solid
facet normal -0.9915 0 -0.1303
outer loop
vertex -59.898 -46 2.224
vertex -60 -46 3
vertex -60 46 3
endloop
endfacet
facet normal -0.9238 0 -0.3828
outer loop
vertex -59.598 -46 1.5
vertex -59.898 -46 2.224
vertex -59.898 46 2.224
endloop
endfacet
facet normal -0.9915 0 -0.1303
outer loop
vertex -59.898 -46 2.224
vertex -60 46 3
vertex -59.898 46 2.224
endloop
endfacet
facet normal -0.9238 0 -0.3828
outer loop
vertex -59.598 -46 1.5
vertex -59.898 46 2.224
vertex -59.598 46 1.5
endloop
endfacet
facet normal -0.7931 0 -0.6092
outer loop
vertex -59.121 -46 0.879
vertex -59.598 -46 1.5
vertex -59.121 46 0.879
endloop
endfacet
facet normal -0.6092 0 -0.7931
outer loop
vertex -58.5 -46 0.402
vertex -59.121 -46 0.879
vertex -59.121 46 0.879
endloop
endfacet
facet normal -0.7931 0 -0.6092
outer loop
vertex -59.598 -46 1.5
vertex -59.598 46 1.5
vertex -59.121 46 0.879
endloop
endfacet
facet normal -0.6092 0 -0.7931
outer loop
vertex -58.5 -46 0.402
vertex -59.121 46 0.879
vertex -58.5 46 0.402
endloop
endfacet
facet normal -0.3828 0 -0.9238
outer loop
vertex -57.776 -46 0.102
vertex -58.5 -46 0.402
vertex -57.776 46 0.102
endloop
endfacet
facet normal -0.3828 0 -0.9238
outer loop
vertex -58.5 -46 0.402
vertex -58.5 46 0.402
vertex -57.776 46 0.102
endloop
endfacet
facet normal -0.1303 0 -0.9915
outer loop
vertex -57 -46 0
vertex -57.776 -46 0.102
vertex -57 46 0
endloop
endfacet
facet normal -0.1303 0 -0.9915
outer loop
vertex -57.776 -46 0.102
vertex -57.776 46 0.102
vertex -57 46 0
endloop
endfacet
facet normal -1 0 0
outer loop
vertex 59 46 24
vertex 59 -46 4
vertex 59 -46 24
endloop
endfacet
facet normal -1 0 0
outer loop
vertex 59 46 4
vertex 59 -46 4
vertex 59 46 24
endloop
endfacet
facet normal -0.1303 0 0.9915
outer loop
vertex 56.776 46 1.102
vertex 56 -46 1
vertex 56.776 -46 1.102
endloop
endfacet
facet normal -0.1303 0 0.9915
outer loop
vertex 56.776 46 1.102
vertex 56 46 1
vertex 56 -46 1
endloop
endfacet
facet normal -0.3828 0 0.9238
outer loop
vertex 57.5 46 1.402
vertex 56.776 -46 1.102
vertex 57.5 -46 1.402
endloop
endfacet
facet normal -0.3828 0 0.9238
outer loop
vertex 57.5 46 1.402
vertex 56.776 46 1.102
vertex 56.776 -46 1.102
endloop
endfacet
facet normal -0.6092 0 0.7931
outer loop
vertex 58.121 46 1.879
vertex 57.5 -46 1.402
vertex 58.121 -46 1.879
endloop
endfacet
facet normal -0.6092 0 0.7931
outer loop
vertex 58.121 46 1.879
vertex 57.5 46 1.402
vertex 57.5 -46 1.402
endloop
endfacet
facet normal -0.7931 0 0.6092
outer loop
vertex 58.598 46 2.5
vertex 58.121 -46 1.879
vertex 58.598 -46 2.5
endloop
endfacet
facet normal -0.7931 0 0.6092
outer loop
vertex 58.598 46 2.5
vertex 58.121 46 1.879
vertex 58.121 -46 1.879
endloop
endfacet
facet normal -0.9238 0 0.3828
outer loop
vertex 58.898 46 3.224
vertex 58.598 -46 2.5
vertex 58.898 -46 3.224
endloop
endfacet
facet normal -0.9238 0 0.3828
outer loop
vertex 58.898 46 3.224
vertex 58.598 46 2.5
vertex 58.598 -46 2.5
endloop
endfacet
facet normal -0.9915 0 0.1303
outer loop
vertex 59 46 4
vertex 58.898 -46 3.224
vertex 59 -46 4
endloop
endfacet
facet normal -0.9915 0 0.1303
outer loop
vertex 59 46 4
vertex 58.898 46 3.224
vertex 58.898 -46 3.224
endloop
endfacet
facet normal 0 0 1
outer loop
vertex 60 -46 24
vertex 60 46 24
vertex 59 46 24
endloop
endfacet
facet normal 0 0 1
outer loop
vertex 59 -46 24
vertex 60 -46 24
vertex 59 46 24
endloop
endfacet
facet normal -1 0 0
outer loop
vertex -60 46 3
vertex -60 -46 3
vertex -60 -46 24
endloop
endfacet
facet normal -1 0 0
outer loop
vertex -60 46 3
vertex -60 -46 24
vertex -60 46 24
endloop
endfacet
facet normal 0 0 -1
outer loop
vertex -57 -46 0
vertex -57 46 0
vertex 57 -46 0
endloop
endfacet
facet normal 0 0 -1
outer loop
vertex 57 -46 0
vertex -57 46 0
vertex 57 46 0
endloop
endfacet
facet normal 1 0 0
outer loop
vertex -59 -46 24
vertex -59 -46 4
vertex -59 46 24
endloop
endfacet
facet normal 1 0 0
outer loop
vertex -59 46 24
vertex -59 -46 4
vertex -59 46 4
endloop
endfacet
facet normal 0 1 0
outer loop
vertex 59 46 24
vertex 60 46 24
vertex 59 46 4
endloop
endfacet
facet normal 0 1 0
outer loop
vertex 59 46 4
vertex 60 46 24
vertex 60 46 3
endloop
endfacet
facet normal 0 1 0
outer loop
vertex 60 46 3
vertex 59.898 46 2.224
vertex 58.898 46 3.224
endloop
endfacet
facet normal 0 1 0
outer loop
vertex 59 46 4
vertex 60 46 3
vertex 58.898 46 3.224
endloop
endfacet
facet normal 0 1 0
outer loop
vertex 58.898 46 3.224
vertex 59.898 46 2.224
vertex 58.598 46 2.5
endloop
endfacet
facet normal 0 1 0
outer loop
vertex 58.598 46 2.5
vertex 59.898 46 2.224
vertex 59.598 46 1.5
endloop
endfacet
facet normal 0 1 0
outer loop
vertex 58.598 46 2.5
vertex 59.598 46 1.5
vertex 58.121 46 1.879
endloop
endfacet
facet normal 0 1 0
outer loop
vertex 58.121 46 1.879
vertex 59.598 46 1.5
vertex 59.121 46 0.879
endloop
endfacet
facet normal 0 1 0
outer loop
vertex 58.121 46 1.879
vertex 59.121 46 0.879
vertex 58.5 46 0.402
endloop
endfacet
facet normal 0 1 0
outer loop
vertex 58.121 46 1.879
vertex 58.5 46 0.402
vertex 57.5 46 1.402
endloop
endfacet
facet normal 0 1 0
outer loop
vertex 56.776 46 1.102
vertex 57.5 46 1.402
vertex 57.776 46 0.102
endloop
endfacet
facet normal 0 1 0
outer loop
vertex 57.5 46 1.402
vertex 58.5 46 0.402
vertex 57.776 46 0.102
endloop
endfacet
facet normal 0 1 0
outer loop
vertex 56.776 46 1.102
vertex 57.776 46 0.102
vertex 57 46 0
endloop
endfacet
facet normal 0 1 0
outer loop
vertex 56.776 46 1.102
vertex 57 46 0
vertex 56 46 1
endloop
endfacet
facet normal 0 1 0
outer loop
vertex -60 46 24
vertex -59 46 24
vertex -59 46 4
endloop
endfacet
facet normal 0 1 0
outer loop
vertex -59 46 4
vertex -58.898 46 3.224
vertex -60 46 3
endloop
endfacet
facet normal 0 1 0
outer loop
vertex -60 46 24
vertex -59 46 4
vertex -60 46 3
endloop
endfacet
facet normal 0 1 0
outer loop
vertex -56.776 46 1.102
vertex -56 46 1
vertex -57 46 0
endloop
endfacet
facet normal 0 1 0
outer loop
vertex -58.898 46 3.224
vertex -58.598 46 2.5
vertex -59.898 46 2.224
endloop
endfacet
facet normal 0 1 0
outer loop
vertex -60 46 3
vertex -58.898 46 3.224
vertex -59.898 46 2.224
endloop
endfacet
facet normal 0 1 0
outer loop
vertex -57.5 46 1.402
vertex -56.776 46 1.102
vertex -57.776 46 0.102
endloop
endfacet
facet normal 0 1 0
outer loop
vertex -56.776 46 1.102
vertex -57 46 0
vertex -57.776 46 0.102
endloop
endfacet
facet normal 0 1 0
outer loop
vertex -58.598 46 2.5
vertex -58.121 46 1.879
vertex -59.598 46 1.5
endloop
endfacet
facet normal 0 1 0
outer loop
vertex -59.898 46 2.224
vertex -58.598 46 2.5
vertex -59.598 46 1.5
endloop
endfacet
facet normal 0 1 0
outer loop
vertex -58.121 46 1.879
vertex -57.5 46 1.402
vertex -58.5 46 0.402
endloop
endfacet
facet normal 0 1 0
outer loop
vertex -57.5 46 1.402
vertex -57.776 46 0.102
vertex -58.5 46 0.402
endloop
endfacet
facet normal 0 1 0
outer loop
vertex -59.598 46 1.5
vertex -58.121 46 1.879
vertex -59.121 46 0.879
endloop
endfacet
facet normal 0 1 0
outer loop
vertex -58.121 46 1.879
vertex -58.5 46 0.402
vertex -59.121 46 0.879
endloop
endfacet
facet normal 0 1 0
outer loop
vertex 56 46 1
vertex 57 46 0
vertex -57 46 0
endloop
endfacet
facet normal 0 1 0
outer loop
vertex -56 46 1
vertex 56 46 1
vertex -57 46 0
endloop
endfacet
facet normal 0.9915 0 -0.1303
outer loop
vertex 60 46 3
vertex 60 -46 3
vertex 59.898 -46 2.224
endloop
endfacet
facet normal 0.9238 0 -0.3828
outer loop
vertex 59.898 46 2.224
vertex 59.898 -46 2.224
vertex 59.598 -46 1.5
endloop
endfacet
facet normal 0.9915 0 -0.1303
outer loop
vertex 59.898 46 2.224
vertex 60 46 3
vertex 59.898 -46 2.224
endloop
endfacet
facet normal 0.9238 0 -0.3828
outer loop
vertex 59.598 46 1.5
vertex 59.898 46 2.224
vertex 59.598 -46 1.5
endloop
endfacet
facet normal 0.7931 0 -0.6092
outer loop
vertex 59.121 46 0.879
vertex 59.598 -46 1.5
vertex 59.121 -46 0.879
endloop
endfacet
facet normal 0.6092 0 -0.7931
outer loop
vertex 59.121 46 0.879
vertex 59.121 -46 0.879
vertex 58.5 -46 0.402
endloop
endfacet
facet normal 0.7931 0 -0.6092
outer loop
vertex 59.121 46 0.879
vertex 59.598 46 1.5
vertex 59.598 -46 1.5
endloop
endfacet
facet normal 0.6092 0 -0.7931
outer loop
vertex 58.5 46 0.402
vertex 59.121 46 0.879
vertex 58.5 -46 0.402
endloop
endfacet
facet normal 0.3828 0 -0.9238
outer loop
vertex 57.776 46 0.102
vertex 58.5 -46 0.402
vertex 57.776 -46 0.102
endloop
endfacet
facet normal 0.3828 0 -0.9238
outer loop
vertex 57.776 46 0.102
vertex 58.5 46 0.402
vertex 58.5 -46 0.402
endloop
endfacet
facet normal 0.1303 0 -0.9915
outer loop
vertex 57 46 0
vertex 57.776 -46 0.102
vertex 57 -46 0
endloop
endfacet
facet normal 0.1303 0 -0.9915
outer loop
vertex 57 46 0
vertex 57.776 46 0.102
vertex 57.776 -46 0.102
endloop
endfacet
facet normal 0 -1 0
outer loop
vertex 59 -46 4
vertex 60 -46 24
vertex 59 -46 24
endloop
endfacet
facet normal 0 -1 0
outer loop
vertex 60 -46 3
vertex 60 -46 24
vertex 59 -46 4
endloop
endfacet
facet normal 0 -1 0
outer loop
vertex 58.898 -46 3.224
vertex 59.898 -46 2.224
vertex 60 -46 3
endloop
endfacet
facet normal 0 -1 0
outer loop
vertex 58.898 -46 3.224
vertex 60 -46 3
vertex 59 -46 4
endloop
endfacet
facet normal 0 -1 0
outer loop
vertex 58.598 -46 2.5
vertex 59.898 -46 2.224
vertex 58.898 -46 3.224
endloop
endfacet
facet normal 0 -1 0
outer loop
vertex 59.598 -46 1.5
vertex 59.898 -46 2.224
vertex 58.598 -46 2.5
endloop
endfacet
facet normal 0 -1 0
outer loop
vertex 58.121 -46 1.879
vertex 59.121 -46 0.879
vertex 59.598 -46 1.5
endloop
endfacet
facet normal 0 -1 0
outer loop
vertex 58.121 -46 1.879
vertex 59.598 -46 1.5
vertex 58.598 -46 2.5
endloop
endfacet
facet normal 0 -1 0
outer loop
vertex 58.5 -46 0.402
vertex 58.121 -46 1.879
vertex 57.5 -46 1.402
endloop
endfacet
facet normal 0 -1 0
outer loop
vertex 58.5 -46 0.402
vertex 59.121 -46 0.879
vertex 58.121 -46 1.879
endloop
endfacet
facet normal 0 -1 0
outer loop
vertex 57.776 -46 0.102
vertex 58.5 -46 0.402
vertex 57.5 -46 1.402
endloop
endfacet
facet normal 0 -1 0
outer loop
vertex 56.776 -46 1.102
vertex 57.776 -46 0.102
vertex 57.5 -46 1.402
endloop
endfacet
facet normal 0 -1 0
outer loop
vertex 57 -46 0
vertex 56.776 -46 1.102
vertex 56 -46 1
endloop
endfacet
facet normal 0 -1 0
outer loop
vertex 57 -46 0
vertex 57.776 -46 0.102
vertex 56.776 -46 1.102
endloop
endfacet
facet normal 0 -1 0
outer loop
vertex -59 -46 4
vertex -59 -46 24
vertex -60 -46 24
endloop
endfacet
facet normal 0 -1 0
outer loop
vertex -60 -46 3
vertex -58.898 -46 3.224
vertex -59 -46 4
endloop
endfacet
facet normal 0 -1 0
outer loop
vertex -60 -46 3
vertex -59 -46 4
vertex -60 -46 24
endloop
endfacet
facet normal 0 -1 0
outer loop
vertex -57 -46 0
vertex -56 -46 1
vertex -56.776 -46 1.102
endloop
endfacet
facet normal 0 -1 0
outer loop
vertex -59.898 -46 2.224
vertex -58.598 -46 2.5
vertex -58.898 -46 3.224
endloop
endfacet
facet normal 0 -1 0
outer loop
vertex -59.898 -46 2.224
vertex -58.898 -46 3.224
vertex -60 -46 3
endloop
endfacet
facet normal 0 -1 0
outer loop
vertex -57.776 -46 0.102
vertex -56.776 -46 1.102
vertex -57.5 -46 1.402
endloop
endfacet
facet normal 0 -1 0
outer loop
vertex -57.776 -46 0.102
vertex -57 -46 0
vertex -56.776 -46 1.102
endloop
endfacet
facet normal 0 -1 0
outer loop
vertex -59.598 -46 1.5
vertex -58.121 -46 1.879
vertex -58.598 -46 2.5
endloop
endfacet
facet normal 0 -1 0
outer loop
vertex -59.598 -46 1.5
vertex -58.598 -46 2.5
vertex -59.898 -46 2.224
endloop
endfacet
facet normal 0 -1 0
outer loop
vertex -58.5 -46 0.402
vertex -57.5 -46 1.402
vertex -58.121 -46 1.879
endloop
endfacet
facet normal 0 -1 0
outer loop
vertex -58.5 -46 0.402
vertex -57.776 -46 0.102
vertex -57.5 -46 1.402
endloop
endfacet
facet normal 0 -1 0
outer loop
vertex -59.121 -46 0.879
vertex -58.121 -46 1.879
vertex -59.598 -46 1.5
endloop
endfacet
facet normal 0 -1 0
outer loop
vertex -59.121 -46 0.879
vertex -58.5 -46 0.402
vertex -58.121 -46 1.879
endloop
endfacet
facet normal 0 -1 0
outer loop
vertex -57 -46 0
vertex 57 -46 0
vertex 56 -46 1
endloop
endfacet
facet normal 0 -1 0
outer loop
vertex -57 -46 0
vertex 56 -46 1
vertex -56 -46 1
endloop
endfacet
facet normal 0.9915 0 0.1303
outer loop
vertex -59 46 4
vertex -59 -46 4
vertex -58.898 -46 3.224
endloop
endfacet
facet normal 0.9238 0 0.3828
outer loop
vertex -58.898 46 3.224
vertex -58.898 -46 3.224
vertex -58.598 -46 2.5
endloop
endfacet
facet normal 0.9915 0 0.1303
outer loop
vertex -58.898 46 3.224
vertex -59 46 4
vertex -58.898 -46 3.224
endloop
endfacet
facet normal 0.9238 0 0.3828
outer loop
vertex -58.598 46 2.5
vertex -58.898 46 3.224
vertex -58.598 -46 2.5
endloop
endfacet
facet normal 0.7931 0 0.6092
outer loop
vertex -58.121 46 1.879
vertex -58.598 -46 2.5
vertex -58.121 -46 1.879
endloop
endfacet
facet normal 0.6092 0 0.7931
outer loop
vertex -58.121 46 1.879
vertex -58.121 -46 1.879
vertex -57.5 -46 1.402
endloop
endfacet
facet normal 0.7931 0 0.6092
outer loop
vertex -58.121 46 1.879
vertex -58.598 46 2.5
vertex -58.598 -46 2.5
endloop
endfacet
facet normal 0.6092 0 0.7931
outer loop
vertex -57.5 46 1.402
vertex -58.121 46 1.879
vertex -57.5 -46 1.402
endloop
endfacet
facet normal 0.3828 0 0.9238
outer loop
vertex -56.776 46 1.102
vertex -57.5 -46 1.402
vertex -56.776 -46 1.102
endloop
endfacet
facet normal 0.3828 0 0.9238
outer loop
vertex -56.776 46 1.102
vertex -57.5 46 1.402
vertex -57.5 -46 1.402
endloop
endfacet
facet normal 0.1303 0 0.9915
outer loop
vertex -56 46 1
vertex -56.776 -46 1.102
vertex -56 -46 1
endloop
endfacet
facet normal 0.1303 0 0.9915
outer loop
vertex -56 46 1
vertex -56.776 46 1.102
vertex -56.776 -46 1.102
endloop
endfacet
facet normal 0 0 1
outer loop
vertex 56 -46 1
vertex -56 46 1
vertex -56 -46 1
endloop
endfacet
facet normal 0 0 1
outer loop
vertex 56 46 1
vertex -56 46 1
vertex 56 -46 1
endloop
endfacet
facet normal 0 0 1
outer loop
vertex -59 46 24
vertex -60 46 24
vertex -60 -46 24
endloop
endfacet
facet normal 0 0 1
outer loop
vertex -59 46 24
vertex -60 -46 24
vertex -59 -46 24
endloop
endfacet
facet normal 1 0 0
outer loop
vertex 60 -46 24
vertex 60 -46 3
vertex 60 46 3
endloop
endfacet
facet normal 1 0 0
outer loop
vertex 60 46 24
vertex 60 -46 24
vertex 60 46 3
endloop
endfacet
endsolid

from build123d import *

# Parameters (mm, degrees)
SKETCH1_W           = 120
SKETCH1_H           = 92
BOSS_EXTRUDE1_DEPTH = 1
SKETCH2_W           = 1
SKETCH2_H           = 92
BOSS_EXTRUDE2_DEPTH = 23
FILLET1_R           = 3
FILLET2_R           = 3
FILLET3_R           = 3


with BuildPart() as part:
    # Sketch1 → Boss-Extrude1 (new body)
    with BuildSketch(Plane.XY):
        Rectangle(SKETCH1_W, SKETCH1_H)
    extrude(amount=BOSS_EXTRUDE1_DEPTH)

    # Sketch2 → Boss-Extrude2 (add)
    with BuildSketch(Plane.XY.offset(1)):
        with Locations((-59.5, 0)):
            Rectangle(SKETCH2_W, SKETCH2_H)
    boss_extrude2 = extrude(amount=BOSS_EXTRUDE2_DEPTH)

    # Fillet1
    fillet1_edges = [part.edges().sort_by_distance(p)[0] for p in [
        (-60, 0, 0),
    ]]
    fillet(fillet1_edges, radius=FILLET1_R)

    # Fillet2
    fillet2_edges = [part.edges().sort_by_distance(p)[0] for p in [
        (-59, 0, 1),
    ]]
    fillet(fillet2_edges, radius=FILLET2_R)

    # Mirror3: Boss-Extrude2 across plane
    add(boss_extrude2.mirror(Plane(origin=(0, 0, 0), x_dir=(0, 0, 1), z_dir=(1, 0, 0))))

    # Fillet3
    fillet3_edges = [part.edges().sort_by_distance(p)[0] for p in [
        (59, 0, 1),
        (60, 0, 0),
    ]]
    fillet(fillet3_edges, radius=FILLET3_R)


solid = part.part
